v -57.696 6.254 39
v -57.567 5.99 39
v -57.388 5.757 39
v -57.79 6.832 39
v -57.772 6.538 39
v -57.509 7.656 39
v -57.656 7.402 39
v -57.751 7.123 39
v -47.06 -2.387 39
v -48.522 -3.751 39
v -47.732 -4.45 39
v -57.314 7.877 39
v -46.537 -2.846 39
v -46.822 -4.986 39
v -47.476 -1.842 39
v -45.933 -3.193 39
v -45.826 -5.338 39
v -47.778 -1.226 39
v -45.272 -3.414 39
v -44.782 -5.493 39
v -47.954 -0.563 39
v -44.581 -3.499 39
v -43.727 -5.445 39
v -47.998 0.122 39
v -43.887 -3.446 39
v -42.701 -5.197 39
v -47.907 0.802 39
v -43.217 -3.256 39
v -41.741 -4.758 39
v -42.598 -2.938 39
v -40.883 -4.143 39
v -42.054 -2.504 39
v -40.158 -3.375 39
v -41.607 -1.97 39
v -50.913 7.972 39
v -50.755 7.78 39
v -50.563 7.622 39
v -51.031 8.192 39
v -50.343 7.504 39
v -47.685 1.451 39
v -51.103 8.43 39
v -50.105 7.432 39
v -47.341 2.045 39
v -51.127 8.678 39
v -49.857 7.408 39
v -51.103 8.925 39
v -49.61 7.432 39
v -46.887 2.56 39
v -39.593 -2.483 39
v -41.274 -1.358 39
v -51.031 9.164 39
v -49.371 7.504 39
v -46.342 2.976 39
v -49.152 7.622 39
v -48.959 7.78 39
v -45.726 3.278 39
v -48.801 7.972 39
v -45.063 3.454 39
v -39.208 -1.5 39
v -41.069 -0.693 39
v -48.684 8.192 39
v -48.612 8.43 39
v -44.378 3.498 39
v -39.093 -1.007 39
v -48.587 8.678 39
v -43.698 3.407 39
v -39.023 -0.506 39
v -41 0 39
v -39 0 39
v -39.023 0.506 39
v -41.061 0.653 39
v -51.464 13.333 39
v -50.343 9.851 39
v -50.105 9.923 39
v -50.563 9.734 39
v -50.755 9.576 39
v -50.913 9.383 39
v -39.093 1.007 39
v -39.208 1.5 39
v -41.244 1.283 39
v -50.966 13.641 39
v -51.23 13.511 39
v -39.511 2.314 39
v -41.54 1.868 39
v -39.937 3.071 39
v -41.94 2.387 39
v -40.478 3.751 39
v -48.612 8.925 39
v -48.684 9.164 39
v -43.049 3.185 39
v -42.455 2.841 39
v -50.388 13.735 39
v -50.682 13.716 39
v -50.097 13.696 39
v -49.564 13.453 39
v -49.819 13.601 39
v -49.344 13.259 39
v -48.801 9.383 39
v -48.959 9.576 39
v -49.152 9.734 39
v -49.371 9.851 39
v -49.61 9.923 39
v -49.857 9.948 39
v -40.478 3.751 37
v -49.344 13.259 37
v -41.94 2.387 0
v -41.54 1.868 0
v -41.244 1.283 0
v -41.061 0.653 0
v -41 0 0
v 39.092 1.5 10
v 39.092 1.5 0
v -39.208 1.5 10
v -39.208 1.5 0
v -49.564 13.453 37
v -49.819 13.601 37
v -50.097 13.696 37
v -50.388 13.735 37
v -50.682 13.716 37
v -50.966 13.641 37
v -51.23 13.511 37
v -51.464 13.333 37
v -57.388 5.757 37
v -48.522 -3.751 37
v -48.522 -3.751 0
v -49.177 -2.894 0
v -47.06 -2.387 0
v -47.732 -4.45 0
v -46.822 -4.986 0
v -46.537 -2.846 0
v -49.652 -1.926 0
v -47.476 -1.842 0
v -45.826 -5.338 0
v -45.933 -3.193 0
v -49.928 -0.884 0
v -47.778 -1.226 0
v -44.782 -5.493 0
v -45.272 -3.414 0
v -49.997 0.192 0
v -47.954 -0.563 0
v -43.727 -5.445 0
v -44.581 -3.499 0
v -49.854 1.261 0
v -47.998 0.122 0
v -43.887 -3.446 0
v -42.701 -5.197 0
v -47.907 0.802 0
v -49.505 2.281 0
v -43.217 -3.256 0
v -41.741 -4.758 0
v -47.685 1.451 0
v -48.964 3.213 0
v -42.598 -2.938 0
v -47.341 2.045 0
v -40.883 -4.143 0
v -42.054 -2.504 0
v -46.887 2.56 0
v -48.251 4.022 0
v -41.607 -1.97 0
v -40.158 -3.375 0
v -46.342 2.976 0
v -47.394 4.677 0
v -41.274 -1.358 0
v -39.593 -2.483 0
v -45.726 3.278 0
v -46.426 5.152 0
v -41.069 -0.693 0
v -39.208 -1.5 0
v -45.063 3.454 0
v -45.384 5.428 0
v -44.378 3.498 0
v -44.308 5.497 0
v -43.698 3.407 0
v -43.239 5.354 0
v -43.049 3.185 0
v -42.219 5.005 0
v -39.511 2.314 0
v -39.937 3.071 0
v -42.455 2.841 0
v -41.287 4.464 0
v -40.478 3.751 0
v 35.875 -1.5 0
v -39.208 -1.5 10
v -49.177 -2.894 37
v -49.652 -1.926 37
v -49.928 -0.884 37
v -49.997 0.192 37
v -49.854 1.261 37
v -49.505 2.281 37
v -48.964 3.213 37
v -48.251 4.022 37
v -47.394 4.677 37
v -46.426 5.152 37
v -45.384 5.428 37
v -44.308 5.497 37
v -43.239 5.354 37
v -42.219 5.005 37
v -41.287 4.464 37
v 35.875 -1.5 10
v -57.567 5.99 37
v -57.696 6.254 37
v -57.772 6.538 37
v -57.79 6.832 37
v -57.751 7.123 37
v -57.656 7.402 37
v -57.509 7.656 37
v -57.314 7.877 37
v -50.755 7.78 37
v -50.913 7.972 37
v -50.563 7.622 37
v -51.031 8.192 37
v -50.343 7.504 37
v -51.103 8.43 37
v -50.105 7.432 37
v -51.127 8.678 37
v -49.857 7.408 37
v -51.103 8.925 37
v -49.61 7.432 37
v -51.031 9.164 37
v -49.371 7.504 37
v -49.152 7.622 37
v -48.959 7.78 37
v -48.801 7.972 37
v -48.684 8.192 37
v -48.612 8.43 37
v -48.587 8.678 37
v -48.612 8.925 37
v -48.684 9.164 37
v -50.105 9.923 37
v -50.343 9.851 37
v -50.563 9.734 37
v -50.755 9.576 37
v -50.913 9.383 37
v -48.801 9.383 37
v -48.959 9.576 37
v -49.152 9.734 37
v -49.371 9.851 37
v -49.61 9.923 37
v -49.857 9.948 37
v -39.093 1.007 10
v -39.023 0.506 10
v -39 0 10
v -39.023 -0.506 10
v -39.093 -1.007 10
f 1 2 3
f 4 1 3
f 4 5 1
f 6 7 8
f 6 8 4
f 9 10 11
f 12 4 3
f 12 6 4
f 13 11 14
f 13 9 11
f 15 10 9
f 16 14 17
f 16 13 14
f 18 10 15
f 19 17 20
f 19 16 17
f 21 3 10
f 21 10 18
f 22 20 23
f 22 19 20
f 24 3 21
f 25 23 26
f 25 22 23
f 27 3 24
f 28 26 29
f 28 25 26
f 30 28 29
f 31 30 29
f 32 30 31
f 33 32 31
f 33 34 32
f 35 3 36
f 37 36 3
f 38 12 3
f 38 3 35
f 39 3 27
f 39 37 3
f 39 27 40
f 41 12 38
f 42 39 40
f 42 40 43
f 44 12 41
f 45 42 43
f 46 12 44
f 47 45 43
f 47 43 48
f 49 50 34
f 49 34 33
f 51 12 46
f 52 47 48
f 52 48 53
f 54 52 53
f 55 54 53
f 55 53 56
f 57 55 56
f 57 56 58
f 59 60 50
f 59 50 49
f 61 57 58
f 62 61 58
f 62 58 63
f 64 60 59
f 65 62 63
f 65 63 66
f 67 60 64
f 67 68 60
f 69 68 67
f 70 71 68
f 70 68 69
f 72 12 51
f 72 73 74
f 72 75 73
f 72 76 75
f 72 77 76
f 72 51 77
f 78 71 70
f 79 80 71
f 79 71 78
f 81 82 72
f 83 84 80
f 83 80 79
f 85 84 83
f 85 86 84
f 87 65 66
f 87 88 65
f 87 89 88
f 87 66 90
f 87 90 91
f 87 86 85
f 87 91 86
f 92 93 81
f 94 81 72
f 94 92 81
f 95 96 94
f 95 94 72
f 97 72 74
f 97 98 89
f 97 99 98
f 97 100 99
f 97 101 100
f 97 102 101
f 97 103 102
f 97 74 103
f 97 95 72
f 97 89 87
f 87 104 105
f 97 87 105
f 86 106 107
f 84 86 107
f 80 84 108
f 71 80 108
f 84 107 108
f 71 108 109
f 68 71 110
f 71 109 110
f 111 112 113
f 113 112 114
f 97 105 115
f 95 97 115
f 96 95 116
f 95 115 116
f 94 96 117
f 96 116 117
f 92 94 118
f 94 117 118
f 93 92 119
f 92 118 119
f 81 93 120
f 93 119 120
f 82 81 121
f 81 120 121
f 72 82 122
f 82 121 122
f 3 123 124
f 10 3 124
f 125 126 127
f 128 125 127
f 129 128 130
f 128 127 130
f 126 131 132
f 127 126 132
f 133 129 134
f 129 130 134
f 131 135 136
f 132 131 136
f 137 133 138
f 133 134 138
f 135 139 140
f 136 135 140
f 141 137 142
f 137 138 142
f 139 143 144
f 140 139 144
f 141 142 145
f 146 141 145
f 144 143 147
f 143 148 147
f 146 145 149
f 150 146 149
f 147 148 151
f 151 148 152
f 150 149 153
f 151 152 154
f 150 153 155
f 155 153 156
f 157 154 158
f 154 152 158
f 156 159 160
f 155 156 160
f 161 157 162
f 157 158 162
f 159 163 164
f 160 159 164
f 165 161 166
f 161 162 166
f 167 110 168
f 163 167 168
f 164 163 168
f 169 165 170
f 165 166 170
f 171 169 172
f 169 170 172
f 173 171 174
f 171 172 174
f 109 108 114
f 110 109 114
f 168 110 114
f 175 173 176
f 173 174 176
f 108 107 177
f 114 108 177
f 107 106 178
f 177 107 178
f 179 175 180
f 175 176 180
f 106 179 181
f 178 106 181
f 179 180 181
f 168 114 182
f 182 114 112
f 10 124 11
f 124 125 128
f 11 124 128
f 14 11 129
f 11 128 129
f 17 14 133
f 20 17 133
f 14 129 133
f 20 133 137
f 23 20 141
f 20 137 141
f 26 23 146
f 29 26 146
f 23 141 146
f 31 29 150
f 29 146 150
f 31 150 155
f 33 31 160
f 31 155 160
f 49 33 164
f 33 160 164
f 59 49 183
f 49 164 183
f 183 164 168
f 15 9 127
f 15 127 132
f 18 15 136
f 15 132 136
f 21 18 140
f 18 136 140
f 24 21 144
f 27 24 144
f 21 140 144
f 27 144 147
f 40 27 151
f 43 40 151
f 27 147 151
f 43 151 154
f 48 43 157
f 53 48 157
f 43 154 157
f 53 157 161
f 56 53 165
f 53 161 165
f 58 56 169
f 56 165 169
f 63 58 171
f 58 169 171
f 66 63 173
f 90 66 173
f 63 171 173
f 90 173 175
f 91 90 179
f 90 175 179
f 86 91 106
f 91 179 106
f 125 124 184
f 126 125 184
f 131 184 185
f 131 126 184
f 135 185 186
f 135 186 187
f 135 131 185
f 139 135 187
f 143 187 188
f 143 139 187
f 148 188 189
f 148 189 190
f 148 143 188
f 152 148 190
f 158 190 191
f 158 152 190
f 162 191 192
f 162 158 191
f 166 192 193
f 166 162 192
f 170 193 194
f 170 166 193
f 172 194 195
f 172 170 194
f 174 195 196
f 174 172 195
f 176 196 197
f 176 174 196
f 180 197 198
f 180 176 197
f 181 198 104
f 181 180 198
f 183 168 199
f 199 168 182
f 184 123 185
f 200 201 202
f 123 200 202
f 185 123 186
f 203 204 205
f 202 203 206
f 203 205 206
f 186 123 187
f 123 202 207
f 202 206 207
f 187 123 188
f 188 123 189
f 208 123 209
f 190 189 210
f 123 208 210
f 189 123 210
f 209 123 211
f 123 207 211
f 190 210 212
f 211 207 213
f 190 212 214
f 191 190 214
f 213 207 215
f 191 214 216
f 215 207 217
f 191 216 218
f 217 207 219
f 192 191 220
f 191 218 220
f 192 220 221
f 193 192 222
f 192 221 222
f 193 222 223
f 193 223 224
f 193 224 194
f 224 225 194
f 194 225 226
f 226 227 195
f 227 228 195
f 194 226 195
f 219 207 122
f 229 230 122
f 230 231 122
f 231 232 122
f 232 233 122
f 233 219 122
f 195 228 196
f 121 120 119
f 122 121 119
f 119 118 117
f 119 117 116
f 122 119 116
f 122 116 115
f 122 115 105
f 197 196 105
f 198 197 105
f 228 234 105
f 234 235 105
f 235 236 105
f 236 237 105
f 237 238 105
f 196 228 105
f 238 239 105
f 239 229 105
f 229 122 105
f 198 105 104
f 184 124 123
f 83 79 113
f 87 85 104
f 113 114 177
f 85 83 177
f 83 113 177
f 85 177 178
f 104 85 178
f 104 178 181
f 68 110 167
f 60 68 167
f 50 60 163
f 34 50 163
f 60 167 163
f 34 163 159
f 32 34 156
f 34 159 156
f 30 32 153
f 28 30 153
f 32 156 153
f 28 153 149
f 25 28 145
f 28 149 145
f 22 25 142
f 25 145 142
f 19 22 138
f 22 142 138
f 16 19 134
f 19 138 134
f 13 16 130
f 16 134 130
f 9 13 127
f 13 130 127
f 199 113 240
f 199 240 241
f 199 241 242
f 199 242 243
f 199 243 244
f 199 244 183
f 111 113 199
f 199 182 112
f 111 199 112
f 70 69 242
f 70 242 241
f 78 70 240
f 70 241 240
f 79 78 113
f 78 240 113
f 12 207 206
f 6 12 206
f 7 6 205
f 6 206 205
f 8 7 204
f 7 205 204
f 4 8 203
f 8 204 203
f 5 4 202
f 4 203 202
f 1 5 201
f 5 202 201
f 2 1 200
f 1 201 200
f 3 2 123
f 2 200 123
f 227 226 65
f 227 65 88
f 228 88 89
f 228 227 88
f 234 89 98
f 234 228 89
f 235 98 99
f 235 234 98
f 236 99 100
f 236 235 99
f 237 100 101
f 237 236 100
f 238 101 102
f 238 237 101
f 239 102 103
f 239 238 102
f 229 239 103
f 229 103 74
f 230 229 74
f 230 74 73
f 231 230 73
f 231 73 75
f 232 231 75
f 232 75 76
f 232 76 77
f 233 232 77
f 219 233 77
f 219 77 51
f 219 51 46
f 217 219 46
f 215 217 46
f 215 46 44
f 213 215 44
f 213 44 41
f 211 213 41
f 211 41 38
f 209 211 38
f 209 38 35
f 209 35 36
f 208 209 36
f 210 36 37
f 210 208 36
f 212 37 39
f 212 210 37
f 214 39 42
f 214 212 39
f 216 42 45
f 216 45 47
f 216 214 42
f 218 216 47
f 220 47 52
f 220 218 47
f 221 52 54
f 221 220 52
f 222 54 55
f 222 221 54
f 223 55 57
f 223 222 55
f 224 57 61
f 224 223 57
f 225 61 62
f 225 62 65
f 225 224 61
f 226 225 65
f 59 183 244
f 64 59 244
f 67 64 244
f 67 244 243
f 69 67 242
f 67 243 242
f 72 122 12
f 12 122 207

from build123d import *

# Parameters (mm, degrees)
F1_DEPTH = 10
F2_DEPTH = 39
F3_R     = 1.27
F4_DEPTH = 39
F0_R     = 1.27
F5_DEPTH = 37


# Not quite as in the source:
# - a feature names something its author has since deleted; it is built from what else it names


with BuildPart() as f1:
    # F0 (on Top) → F1 (new body)
    with BuildSketch(Plane.XY):
        with BuildLine():
            Line((39.0916730868, 1.5), (-39.2084973779, 1.5))
            ThreePointArc((-39.2084973779, 1.5), (-39.0523737086, 0.7572105316), (-39, 0))
            ThreePointArc((-39, 0), (-39.0523737086, -0.7572105316), (-39.2084973779, -1.5))
            Line((-39.2084973779, -1.5), (35.8745669567, -1.5))
            Line((35.8745669567, -1.5), (39.0916730868, 1.5))
        make_face()
    extrude(amount=F1_DEPTH)

    # F0 (on Top) → F2 (join)
    with BuildSketch(Plane.XY):
        with BuildLine():
            ThreePointArc((-47.0597379557, -2.3869942602), (-46.8869942602, 2.5597379557), (-41.9402620443, 2.3869942602))
            Line((-41.9402620443, 2.3869942602), (-40.4775546411, 3.7509909803))
            ThreePointArc((-40.4775546411, 3.7509909803), (-48.2509909803, 4.0224453589), (-48.5224453589, -3.7509909803))
            Line((-48.5224453589, -3.7509909803), (-47.0597379557, -2.3869942602))
        make_face()
        with BuildLine():
            ThreePointArc((-41.9402620443, 2.3869942602), (-41.2435385121, 1.2827542935), (-41, 0))
            ThreePointArc((-41, 0), (-43.2172457065, -3.2564614879), (-47.0597379557, -2.3869942602))
            Line((-47.0597379557, -2.3869942602), (-48.5224453589, -3.7509909803))
            ThreePointArc((-48.5224453589, -3.7509909803), (-43.2079602627, -5.346085794), (-39.2084973779, -1.5))
            ThreePointArc((-39.2084973779, -1.5), (-39.0523737086, -0.7572105316), (-39, 0))
            ThreePointArc((-39, 0), (-39.0523737086, 0.7572105316), (-39.2084973779, 1.5))
            ThreePointArc((-39.2084973779, 1.5), (-39.7089513834, 2.7010836998), (-40.4775546411, 3.7509909803))
            Line((-40.4775546411, 3.7509909803), (-41.9402620443, 2.3869942602))
        make_face()
    extrude(amount=F2_DEPTH)

    # F3 (on face) → F4 (join)
    with BuildSketch(Plane.XY):
        with BuildLine():
            Line((-57.3884240397, 5.7566071407), (-48.5224453589, -3.7509909803))
            ThreePointArc((-48.5224453589, -3.7509909803), (-48.2509909803, 4.0224453589), (-40.4775546411, 3.7509909803))
            Line((-40.4775546411, 3.7509909803), (-49.3435333219, 13.2585891014))
            ThreePointArc((-49.3435333219, 13.2585891014), (-50.3882146293, 13.7346778018), (-51.4635614144, 13.3326221137))
            Line((-51.4635614144, 13.3326221137), (-57.3143910274, 7.8766352332))
            ThreePointArc((-57.3143910274, 7.8766352332), (-57.7904797278, 6.8319539259), (-57.3884240397, 5.7566071407))
        make_face()
        with Locations((-49.8572761974, 8.6775337363)):
            Circle(F3_R, mode=Mode.SUBTRACT)
    extrude(amount=F4_DEPTH)

    # F0 (on Top) → F5 (cut)
    with BuildSketch(Plane.XY):
        with BuildLine():
            ThreePointArc((-48.5224453589, -3.7509909803), (-48.2509909803, 4.0224453589), (-40.4775546411, 3.7509909803))
            Line((-40.4775546411, 3.7509909803), (-49.3435333219, 13.2585891014))
            ThreePointArc((-49.3435333219, 13.2585891014), (-50.3882146293, 13.7346778018), (-51.4635614144, 13.3326221137))
            Line((-51.4635614144, 13.3326221137), (-57.3143910274, 7.8766352332))
            ThreePointArc((-57.3143910274, 7.8766352332), (-57.7904797278, 6.8319539259), (-57.3884240397, 5.7566071407))
            Line((-57.3884240397, 5.7566071407), (-48.5224453589, -3.7509909803))
        make_face()
        with Locations((-49.8572761974, 8.6775337363)):
            Circle(F0_R, mode=Mode.SUBTRACT)
    extrude(amount=F5_DEPTH, mode=Mode.SUBTRACT)


solid = f1.part
